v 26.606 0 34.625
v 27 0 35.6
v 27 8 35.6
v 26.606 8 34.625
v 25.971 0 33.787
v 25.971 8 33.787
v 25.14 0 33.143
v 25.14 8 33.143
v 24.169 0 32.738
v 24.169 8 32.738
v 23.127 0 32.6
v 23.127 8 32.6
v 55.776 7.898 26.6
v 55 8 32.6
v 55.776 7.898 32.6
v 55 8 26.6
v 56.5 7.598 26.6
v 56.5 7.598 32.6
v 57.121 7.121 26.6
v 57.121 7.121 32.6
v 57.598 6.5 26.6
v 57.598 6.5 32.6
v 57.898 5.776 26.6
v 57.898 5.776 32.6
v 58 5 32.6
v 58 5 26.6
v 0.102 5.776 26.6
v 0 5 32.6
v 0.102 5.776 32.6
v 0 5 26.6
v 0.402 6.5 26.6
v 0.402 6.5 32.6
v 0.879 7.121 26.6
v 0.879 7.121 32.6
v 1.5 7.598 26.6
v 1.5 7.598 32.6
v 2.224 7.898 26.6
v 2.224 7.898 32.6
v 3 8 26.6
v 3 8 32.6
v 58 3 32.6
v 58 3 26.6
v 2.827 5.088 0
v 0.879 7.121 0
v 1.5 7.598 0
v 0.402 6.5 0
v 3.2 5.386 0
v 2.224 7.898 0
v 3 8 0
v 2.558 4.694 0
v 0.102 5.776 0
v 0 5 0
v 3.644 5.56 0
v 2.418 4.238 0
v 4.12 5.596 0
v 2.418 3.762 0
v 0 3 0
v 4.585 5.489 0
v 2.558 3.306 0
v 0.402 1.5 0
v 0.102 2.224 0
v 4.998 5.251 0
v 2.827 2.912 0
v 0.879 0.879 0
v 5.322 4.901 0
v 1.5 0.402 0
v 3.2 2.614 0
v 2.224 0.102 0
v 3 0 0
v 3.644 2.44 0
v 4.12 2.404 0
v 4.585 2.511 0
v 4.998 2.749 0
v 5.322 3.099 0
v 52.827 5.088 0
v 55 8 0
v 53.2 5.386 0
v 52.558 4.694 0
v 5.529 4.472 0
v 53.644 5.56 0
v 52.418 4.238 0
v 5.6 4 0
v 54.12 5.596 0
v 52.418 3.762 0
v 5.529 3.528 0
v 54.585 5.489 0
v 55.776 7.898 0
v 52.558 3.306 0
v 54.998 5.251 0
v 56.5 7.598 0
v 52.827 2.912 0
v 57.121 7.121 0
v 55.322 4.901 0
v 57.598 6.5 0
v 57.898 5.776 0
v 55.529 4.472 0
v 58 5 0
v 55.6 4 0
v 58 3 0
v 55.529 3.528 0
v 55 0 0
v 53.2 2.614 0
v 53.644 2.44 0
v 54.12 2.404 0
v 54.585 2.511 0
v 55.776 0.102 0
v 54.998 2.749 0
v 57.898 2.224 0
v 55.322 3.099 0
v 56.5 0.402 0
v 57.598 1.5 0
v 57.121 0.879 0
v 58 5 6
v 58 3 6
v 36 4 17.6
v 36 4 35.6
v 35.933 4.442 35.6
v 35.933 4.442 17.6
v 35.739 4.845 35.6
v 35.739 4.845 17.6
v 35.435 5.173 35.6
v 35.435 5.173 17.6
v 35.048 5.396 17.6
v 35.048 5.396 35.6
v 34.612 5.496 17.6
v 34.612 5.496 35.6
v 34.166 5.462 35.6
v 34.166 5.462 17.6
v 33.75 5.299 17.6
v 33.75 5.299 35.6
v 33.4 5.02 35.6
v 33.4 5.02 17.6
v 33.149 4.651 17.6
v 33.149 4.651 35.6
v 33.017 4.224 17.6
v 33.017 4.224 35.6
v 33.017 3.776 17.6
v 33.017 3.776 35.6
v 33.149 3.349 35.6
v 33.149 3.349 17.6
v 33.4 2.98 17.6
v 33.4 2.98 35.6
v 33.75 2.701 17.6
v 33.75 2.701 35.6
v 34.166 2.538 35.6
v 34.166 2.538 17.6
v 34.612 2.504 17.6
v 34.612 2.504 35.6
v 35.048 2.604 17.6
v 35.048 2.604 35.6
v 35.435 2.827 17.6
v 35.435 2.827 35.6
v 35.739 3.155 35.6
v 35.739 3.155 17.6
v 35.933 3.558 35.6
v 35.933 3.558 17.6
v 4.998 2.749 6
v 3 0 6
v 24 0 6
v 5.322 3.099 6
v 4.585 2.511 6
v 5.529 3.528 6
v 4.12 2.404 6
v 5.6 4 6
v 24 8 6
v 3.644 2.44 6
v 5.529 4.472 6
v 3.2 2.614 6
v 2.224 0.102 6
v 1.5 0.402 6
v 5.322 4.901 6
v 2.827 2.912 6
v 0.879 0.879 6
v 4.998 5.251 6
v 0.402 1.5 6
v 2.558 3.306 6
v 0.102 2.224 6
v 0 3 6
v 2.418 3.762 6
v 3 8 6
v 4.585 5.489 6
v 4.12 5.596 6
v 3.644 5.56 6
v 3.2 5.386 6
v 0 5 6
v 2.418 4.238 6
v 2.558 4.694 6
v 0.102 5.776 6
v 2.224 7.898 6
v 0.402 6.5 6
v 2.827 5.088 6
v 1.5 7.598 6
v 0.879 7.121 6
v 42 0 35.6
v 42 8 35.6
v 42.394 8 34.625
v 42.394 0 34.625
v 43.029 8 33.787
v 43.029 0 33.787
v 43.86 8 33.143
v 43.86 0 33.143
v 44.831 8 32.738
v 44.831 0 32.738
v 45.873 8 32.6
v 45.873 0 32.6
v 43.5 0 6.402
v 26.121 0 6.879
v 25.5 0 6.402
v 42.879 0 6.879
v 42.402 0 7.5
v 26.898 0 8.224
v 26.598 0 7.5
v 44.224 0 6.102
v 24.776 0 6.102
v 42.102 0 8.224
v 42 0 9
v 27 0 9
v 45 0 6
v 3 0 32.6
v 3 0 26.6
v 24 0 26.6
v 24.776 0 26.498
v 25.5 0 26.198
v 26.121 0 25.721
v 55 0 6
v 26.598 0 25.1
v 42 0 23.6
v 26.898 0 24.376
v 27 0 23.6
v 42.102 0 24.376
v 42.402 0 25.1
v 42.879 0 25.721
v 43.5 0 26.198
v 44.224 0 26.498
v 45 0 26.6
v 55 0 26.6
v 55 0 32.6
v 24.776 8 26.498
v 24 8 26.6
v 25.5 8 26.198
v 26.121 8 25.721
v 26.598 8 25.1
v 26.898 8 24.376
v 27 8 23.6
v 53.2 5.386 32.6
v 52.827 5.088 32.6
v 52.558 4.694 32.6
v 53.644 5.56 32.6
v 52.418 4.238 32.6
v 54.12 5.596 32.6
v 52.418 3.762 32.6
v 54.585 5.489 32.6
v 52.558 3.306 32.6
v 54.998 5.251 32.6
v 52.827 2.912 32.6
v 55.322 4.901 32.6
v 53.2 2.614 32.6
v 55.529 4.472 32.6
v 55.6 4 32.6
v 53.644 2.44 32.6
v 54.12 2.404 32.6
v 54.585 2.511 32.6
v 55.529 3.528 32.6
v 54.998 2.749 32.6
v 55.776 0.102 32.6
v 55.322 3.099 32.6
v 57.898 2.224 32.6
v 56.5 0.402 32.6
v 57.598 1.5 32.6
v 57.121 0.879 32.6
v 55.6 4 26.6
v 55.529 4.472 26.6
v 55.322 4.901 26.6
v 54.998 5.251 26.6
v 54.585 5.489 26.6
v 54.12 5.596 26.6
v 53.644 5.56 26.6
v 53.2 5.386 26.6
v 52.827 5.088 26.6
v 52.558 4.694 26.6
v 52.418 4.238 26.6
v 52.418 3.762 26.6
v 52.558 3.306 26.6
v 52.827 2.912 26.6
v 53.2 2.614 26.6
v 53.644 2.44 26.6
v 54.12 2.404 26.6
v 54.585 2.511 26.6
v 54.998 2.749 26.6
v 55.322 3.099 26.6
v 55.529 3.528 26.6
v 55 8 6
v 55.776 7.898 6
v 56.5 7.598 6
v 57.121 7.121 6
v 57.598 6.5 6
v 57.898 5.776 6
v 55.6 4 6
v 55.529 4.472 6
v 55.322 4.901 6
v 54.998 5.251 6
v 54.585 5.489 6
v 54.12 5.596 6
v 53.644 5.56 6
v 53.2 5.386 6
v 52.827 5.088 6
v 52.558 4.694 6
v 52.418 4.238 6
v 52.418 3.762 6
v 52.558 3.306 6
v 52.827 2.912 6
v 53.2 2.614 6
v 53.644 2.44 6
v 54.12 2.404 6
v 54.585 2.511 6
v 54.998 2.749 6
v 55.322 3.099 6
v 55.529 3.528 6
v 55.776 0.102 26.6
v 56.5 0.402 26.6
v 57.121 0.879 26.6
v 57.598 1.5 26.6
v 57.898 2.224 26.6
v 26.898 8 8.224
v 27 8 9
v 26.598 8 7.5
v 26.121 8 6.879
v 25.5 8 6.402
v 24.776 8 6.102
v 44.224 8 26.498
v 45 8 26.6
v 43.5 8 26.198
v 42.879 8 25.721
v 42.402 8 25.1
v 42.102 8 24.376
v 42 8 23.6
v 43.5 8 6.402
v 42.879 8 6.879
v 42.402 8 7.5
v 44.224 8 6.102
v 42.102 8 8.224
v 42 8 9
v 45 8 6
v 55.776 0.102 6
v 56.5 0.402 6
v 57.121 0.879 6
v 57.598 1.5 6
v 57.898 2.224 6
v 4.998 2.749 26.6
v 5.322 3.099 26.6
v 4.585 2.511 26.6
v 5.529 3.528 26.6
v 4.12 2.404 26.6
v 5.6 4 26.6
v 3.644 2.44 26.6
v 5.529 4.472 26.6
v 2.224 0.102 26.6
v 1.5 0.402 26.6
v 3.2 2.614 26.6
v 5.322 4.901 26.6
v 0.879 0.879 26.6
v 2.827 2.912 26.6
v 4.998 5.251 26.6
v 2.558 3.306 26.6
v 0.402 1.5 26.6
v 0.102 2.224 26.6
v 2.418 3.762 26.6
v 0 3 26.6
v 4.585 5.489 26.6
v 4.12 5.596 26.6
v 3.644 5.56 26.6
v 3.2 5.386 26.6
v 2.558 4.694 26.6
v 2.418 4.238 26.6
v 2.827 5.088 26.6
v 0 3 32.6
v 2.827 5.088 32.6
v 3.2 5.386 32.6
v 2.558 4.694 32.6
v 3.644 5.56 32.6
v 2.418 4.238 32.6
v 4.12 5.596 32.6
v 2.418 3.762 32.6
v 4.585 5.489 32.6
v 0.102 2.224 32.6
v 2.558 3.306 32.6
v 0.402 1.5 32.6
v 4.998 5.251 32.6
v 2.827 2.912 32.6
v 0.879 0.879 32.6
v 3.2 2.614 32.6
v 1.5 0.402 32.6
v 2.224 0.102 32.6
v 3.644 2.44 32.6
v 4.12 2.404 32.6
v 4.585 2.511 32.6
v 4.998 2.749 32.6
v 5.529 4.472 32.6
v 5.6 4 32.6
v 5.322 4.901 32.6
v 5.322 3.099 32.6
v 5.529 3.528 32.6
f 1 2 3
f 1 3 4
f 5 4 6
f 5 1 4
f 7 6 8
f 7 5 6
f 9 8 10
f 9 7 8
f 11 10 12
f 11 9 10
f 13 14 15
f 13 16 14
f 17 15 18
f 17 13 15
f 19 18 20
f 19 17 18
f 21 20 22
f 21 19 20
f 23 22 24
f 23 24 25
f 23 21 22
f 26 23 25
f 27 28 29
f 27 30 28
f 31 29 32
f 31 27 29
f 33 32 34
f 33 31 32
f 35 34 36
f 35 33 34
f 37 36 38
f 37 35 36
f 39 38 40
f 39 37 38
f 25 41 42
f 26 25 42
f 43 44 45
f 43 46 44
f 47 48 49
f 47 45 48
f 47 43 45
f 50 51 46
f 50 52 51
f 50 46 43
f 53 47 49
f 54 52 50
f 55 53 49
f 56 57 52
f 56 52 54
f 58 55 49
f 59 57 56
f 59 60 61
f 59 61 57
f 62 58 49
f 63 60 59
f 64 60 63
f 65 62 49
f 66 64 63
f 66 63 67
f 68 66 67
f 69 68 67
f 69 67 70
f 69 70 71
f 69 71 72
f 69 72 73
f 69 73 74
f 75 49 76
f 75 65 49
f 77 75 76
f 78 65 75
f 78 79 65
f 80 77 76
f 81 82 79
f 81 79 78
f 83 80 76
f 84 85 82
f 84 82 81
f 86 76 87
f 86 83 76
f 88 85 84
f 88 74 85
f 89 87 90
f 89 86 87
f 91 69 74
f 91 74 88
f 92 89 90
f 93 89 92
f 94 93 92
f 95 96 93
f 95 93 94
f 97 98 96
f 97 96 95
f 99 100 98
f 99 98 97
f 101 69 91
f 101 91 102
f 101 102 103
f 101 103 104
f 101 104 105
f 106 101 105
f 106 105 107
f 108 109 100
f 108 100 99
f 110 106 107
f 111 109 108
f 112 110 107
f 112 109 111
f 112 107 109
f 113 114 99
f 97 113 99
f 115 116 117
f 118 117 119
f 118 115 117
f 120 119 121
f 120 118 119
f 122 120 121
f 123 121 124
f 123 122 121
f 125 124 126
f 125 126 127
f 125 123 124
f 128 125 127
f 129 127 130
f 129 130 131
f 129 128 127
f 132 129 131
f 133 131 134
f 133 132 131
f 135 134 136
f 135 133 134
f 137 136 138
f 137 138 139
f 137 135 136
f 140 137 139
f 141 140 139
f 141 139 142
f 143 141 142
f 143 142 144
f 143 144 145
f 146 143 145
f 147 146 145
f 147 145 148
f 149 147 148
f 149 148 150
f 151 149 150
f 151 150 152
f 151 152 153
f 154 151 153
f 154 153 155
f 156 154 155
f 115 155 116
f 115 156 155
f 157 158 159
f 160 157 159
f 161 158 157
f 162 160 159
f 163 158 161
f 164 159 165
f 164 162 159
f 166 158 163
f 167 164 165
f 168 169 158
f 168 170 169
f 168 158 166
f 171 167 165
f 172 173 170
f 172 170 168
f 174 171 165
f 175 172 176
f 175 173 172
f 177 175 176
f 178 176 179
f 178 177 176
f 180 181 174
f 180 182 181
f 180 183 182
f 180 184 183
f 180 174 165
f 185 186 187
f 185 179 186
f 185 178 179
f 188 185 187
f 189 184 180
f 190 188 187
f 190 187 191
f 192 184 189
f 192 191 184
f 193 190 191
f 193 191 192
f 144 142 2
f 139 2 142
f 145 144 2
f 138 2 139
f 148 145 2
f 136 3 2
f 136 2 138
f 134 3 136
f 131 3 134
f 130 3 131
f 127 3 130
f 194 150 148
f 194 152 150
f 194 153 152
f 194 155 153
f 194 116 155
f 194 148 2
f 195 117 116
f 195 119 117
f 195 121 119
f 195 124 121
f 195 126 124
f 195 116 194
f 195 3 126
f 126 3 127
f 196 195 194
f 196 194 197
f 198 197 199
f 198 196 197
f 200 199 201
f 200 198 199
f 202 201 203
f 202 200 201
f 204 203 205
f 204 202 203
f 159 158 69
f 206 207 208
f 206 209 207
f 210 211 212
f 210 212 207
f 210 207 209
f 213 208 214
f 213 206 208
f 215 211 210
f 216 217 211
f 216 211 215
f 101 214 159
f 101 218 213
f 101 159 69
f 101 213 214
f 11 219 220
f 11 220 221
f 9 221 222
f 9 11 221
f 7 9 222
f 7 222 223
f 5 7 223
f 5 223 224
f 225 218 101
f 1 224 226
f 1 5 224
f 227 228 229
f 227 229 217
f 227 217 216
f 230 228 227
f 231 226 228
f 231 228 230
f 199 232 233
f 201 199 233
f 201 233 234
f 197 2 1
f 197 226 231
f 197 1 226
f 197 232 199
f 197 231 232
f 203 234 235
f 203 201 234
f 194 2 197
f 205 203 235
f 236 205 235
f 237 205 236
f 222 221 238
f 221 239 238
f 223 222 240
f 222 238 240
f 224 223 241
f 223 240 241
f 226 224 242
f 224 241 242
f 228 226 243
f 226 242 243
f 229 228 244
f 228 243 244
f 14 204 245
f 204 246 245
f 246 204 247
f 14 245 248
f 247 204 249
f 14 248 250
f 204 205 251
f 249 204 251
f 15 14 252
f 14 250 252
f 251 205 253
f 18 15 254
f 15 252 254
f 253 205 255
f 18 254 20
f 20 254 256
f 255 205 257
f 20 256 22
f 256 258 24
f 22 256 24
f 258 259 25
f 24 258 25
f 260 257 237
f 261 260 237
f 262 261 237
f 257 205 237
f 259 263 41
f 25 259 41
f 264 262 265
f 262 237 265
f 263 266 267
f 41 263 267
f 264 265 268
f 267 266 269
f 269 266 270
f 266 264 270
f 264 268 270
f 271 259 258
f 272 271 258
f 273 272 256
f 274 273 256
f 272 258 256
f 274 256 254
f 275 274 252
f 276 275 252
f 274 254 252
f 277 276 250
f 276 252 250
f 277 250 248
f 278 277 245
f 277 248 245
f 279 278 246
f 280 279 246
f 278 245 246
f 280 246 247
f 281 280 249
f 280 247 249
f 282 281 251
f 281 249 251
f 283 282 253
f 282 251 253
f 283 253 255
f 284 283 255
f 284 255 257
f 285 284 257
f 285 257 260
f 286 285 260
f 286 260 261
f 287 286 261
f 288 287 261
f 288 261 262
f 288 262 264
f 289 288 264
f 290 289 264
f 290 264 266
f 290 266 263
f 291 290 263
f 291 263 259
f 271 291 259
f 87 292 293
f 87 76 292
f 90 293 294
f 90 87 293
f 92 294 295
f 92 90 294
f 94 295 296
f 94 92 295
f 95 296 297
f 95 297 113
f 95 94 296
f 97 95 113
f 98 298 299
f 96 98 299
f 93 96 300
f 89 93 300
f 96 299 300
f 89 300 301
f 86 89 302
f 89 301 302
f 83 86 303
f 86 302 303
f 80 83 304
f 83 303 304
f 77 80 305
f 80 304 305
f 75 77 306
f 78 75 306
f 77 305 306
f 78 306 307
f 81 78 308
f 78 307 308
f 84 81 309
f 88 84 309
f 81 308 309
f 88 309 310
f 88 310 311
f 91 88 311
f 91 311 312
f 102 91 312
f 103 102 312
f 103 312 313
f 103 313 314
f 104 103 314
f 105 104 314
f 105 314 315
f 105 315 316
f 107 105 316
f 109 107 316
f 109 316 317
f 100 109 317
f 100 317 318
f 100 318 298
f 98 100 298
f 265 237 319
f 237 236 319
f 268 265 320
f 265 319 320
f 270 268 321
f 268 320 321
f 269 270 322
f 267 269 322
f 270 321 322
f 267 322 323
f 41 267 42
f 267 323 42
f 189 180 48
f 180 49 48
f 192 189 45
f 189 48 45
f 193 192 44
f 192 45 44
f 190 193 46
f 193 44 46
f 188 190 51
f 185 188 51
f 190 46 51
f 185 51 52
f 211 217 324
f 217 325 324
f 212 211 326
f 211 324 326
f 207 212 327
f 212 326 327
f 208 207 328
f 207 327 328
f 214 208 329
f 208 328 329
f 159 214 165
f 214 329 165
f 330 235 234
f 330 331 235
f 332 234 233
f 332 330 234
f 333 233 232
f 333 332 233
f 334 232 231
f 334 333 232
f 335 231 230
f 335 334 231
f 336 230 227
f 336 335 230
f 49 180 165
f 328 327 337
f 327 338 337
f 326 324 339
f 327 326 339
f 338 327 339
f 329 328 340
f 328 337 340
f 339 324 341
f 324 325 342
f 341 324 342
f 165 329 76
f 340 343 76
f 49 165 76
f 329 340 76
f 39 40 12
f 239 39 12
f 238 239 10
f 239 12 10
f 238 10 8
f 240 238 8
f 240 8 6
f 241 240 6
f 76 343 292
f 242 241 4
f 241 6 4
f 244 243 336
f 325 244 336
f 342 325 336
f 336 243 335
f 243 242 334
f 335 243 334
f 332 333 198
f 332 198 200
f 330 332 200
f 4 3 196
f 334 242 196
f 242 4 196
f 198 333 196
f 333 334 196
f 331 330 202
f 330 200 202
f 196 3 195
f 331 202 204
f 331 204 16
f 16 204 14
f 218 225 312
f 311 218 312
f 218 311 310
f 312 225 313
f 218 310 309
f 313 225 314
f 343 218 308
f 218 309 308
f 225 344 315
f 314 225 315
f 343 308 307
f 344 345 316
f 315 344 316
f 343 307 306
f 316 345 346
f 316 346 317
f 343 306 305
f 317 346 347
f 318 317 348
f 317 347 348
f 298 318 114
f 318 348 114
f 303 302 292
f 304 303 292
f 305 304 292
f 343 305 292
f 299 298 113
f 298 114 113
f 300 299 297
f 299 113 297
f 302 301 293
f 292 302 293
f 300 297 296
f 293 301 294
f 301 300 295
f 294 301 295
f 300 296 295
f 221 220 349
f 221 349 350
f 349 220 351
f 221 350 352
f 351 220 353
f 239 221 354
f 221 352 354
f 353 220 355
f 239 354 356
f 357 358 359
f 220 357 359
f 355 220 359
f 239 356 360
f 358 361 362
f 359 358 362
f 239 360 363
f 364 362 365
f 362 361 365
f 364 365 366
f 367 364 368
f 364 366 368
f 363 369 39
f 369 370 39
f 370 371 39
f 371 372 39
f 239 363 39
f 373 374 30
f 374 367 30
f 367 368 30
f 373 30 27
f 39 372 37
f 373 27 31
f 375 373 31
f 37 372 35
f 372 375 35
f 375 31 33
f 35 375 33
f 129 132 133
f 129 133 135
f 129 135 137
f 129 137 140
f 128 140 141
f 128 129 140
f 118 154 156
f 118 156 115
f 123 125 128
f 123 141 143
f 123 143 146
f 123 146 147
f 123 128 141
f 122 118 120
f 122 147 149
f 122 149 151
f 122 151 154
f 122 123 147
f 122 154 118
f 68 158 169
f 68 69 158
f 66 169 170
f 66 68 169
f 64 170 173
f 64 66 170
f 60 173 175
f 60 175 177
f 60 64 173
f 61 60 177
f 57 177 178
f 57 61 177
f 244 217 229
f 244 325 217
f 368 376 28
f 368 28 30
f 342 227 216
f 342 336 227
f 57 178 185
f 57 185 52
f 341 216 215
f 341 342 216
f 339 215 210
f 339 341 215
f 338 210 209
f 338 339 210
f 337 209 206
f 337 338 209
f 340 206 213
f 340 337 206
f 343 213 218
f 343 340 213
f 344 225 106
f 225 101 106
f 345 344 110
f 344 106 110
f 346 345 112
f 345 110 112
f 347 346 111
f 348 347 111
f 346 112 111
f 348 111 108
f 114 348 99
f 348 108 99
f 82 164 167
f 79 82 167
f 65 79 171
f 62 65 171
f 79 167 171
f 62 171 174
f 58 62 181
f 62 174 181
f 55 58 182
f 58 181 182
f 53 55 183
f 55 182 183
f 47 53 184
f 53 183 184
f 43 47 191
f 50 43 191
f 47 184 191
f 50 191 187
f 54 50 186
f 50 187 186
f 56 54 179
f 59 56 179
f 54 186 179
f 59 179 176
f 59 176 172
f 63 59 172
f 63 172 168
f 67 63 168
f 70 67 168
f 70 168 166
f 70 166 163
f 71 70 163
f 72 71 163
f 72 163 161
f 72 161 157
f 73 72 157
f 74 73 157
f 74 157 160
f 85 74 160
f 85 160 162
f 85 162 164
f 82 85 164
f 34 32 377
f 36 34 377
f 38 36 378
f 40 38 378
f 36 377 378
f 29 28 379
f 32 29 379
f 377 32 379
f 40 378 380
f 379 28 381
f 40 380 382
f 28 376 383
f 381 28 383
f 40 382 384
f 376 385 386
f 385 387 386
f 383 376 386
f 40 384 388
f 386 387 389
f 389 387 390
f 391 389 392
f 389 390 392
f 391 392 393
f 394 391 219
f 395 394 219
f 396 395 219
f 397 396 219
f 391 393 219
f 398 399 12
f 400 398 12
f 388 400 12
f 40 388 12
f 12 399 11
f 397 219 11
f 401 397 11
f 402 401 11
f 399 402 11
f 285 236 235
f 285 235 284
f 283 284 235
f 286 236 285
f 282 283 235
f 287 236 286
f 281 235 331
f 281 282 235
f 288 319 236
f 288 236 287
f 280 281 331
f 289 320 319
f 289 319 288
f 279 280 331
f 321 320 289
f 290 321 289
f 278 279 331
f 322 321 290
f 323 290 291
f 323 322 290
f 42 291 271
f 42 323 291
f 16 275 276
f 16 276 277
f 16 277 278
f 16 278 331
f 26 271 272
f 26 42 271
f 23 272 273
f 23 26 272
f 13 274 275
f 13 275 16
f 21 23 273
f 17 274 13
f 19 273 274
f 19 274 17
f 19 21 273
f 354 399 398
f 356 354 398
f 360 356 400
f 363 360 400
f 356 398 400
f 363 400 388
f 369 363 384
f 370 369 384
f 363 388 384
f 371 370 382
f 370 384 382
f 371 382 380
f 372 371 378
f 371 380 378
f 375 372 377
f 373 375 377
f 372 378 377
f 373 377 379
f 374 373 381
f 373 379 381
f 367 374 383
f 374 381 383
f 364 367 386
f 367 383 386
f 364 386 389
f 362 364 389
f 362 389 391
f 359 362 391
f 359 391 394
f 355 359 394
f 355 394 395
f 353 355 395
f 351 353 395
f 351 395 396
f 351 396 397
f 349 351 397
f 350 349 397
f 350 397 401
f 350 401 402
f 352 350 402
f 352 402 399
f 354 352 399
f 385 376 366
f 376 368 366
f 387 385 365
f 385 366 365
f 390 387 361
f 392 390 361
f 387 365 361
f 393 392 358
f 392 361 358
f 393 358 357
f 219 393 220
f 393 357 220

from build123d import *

# Parameters (mm, degrees)
SKETCH1_W               = 58
SKETCH1_H               = 32.6
BOSS_EXTRUDE1_DEPTH     = 8
SKETCH2_W               = 20.6
SKETCH2_H               = 8
CUT_EXTRUDE1_DEPTH      = 16
SKETCH3_W               = 20.6
SKETCH3_H               = 8
CUT_EXTRUDE2_DEPTH      = 27
SKETCH5_R               = 1.6
CUT_EXTRUDE4_DEPTH      = 68.013133041
FILLET1_R               = 3
FILLET2_R               = 3
SKETCH7_W               = 15
SKETCH7_H               = 8
BOSS_EXTRUDE2_DEPTH     = 3
CUT_EXTRUDE5_DEPTH      = 3
CUT_EXTRUDE5_DEPTH_BACK = 15
SKETCH6_R               = 1.5
FILLET3_R               = 4


with BuildPart() as part:
    # Sketch1 → Boss-Extrude1 (new body)
    with BuildSketch(Plane(origin=(0, 0, 0), x_dir=(1, 0, 0), z_dir=(0, 1, 0))):
        with Locations((29, -16.3)):
            Rectangle(SKETCH1_W, SKETCH1_H)
    extrude(amount=BOSS_EXTRUDE1_DEPTH)

    # Sketch2 → Cut-Extrude1 (cut)
    with BuildSketch(Plane(origin=(58, 0, 0), x_dir=(0, 0, -1), z_dir=(1, 0, 0))):
        with Locations((-16.3, 4)):
            Rectangle(SKETCH2_W, SKETCH2_H)
    extrude(amount=-CUT_EXTRUDE1_DEPTH, mode=Mode.SUBTRACT)

    # Sketch3 → Cut-Extrude2 (cut)
    with BuildSketch(Plane.ZY):
        with Locations((16.3, 4)):
            Rectangle(SKETCH3_W, SKETCH3_H)
    extrude(amount=-CUT_EXTRUDE2_DEPTH, mode=Mode.SUBTRACT)

    # Sketch5 → Cut-Extrude4 (cut, through all)
    with BuildSketch(Plane.XY.offset(32.6)):
        with Locations((4, 4)):
            Circle(SKETCH5_R)
        with Locations((54, 4)):
            Circle(SKETCH5_R)
    extrude(amount=-CUT_EXTRUDE4_DEPTH, mode=Mode.SUBTRACT)

    # Fillet1
    fillet1_edges = [part.edges().sort_by_distance(p)[0] for p in [
        (58, 8, 29.6),
        (58, 0, 3),
        (58, 8, 3),
        (0, 0, 29.6),
        (0, 8, 29.6),
        (0, 8, 3),
        (58, 0, 29.6),
        (0, 0, 3),
    ]]
    fillet(fillet1_edges, radius=FILLET1_R)

    # Fillet2
    fillet2_edges = [part.edges().sort_by_distance(p)[0] for p in [
        (42, 4, 26.6),
        (42, 4, 6),
        (27, 4, 6),
        (27, 4, 26.6),
    ]]
    fillet(fillet2_edges, radius=FILLET2_R)

    # Sketch7 → Boss-Extrude2 (add)
    with BuildSketch(Plane.XY.offset(32.6)):
        with Locations((34.5, 4)):
            Rectangle(SKETCH7_W, SKETCH7_H)
    extrude(amount=BOSS_EXTRUDE2_DEPTH)

    # Sketch6 → Cut-Extrude5 (cut, two sides: drawn at the far end of the back side and taken through both)
    with BuildSketch(Plane.XY.offset(32.6).offset(-CUT_EXTRUDE5_DEPTH_BACK)):
        with Locations((34.5, 4)):
            Circle(SKETCH6_R)
    extrude(amount=CUT_EXTRUDE5_DEPTH + CUT_EXTRUDE5_DEPTH_BACK, mode=Mode.SUBTRACT)

    # Fillet3
    # the kernel refuses this fillet: 4 mm, written as the material it adds along each edge
    with BuildSketch(Plane(origin=(42, 8, 32.6), x_dir=(0, 0, 1), z_dir=(0, -1, 0))) as fillet3_piece_1:
        with BuildLine():
            CenterArc((4, -3.872983346), FILLET3_R, 104.477512186, 75.522487814)
            Line((0, -3.872983346), (-0.08, -3.872983346))
            Line((-0.08, -3.872983346), (-0.08, 0))
            Line((-0.08, 0), (0, 0.08))
            ThreePointArc((0, 0.08), (1.5, 0.08), (2.98, 0.077459667))
            Line((2.98, 0.077459667), (3, 0))
        make_face()
    extrude(amount=8)
    with BuildSketch(Plane(origin=(27, 0, 32.6), x_dir=(-1, 0, 0), z_dir=(0, 1, 0))) as fillet3_piece_2:
        with BuildLine():
            CenterArc((3.872983346, 4), FILLET3_R, 194.477512186, 75.522487814)
            Line((0, 3), (-0.077459667, 2.98))
            ThreePointArc((-0.077459667, 2.98), (-0.08, 1.5), (-0.08, 0))
            Line((-0.08, 0), (0, -0.08))
            Line((0, -0.08), (3.872983346, -0.08))
            Line((3.872983346, -0.08), (3.872983346, 0))
        make_face()
    extrude(amount=8)


solid = part.part
